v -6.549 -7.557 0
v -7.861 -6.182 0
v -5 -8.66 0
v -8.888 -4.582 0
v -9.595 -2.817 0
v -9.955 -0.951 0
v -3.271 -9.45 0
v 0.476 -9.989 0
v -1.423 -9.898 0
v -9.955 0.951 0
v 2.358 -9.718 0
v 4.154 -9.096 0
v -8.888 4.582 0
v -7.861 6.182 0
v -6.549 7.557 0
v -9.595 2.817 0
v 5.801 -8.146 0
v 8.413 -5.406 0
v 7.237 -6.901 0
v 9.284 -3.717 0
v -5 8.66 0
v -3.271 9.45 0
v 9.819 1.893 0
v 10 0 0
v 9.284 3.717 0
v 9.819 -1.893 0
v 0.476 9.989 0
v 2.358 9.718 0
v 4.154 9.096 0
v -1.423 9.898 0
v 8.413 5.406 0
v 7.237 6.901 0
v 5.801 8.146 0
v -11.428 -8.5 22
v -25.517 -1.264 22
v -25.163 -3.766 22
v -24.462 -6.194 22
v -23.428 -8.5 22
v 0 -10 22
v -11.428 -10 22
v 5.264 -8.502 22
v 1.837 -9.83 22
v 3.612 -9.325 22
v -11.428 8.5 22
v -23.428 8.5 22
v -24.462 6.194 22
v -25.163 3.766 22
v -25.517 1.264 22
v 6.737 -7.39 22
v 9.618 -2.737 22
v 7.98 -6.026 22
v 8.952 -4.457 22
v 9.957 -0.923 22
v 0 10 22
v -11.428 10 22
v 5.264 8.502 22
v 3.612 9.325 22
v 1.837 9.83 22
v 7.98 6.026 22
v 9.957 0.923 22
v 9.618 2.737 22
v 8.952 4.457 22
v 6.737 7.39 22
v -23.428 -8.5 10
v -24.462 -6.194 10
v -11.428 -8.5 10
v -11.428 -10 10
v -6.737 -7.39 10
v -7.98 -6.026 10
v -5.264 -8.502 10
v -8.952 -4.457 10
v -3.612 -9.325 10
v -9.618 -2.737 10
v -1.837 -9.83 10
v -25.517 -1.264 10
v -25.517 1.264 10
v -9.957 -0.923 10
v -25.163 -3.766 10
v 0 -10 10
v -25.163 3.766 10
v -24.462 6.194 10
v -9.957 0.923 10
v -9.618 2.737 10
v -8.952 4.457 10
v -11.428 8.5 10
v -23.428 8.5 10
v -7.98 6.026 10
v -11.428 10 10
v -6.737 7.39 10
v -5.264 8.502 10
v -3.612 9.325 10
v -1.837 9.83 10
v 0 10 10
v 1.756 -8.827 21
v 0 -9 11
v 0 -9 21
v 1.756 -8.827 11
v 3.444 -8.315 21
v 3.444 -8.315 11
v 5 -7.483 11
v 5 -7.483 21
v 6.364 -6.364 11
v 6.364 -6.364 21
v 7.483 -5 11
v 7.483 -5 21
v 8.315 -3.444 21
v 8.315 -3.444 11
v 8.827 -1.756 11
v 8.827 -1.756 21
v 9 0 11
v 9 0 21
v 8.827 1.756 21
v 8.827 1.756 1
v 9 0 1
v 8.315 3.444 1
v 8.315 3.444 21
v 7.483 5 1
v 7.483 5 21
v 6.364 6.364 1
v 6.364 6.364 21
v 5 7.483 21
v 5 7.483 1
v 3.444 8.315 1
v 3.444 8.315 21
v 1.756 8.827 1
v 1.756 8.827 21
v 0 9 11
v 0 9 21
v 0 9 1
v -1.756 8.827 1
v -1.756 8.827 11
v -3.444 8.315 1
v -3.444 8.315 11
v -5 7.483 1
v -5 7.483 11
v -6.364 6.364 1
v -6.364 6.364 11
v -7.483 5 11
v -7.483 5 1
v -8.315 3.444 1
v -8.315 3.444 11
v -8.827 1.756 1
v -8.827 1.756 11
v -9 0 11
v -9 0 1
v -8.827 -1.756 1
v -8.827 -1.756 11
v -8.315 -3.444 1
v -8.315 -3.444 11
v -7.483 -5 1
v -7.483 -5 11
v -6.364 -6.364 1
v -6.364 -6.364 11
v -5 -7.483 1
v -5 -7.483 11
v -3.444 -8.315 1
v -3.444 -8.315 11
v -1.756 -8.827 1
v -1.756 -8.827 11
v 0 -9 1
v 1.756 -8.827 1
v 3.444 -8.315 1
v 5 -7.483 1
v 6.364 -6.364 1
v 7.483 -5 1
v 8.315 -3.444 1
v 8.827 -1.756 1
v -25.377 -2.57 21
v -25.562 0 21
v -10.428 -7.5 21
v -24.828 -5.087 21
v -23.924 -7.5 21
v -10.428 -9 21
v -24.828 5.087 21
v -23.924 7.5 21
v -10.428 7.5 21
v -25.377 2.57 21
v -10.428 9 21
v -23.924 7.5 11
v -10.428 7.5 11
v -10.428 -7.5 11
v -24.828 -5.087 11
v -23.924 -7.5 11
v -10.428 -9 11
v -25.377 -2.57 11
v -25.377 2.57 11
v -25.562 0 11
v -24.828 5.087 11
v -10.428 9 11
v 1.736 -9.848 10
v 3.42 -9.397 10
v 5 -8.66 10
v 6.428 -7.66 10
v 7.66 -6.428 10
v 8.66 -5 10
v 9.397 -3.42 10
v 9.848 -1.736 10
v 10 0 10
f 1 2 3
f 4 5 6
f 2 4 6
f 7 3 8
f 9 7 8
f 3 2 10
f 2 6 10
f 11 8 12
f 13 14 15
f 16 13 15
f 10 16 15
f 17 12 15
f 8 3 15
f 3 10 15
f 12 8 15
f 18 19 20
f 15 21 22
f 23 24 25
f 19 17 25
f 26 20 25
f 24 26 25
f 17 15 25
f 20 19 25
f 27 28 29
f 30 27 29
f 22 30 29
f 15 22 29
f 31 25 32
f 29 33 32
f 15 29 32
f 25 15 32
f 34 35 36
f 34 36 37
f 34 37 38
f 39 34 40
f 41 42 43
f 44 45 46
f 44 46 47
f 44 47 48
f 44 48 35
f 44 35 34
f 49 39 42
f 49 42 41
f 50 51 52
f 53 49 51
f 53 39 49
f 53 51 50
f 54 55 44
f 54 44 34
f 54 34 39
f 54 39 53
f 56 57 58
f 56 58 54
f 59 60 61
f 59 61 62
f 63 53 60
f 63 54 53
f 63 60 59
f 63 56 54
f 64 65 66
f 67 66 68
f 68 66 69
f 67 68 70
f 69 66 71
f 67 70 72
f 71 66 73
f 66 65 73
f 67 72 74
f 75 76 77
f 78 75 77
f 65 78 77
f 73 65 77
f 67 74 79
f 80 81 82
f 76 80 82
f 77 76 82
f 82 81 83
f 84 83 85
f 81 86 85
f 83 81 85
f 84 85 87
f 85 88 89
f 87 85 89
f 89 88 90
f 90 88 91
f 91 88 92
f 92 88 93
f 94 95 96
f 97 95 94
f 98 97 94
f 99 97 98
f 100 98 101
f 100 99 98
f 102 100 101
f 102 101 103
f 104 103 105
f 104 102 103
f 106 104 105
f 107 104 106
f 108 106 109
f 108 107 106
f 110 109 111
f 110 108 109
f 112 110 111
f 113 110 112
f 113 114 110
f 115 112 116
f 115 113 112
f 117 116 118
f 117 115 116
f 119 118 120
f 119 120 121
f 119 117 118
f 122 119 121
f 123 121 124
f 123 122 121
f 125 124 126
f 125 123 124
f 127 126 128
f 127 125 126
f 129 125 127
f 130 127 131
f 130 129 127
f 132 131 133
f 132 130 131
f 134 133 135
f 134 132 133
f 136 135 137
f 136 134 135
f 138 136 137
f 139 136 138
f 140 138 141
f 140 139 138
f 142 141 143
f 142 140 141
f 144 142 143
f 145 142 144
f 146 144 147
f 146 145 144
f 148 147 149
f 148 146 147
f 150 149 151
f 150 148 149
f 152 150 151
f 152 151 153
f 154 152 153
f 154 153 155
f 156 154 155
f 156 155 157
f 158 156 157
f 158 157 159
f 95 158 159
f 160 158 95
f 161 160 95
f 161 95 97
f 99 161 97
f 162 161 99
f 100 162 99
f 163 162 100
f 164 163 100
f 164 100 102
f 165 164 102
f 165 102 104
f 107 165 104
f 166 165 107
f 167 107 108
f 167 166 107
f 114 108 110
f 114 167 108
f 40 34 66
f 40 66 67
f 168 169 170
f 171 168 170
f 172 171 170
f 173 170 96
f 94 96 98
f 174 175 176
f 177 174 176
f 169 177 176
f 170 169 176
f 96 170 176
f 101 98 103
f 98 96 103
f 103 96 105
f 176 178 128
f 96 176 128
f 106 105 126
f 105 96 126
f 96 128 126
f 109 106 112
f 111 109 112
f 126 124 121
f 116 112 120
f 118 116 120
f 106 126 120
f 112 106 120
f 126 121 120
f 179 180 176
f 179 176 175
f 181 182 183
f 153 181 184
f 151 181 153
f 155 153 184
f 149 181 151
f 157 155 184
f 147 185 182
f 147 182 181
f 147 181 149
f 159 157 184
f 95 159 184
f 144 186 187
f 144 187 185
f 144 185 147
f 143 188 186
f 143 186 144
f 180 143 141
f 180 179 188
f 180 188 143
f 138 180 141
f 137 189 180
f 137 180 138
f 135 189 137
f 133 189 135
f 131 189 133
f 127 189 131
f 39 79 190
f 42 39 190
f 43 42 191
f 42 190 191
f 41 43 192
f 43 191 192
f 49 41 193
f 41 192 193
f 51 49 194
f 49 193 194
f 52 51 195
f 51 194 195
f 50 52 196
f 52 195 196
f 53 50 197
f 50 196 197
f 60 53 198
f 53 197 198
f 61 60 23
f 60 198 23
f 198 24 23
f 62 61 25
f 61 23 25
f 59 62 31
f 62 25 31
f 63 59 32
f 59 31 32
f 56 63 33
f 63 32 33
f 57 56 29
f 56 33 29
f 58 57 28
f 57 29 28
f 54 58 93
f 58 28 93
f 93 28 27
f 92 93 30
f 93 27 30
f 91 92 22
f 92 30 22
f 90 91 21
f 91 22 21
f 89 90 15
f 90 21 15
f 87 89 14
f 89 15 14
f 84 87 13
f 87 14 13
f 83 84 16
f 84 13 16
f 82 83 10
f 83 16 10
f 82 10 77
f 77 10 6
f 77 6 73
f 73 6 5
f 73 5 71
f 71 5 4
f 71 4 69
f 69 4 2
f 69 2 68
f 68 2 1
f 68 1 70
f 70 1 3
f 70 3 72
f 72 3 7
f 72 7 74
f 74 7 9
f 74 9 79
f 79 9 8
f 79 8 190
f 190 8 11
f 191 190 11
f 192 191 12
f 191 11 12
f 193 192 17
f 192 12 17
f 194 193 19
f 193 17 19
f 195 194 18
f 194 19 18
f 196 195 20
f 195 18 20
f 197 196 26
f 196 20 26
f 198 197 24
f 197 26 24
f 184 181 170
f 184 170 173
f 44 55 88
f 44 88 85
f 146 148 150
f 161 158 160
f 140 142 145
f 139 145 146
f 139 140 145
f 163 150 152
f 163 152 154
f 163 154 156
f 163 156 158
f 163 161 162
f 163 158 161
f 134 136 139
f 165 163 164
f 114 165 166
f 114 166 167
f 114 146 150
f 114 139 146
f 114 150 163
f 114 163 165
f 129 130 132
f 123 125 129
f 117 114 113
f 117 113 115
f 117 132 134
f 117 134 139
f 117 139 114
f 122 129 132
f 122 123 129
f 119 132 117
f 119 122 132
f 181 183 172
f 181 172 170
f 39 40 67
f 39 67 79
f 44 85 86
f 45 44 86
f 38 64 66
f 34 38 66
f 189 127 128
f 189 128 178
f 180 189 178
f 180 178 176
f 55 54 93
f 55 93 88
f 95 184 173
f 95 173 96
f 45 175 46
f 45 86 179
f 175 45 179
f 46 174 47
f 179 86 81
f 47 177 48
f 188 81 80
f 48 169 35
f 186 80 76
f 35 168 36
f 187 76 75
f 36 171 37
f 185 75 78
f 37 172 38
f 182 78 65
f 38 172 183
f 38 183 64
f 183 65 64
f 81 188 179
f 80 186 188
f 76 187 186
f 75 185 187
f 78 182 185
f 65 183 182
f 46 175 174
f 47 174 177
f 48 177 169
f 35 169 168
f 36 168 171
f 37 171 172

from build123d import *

# Parameters (mm, degrees)
ESQUISSE1_R        = 10
BOSS_EXTRU_1_DEPTH = 10
BOSS_EXTRU_4_DEPTH = 12
COQUE1_START       = 11
COQUE1_DEPTH       = 10
COQUE1_START_2     = 1
COQUE1_2_OUTLINE_R = 9
COQUE1_2_DEPTH     = 10


# Read off the part's stored shape, not the designer's step: Coque1
with BuildPart() as part:
    # Esquisse1 → Boss.-Extru.1 (new body)
    with BuildSketch(Plane.XY):
        Circle(ESQUISSE1_R)
    extrude(amount=BOSS_EXTRU_1_DEPTH)

    # Esquisse5 → Boss.-Extru.4 (add)
    with BuildSketch(Plane.XY.offset(10)):
        with BuildLine():
            Line((-11.427841592, -10), (0, -10))
            ThreePointArc((0, -10), (10, 0), (0, 10))
            Line((0, 10), (-11.427841592, 10))
            Line((-11.427841592, 10), (-11.427841592, 8.5))
            Line((-11.427841592, 8.5), (-23.427841592, 8.5))
            ThreePointArc((-23.427841592, 8.5), (-25.561840174, 0), (-23.427841592, -8.5))
            Line((-23.427841592, -8.5), (-11.427841592, -8.5))
            Line((-11.427841592, -8.5), (-11.427841592, -10))
        make_face()
    extrude(amount=BOSS_EXTRU_4_DEPTH)

    # Coque1 outline → Coque1 (cut)
    with BuildSketch(Plane.XY.offset(COQUE1_START)):
        with BuildLine():
            ThreePointArc((0, -9), (9, 0), (0, 9))
            Line((0, 9), (-10.427841592, 9))
            Line((-10.427841592, 9), (-10.427841592, 7.5))
            Line((-10.427841592, 7.5), (-23.924439446, 7.5))
            ThreePointArc((-23.924439446, 7.5), (-25.561840174, 0), (-23.924439446, -7.5))
            Line((-23.924439446, -7.5), (-10.427841592, -7.5))
            Line((-10.427841592, -7.5), (-10.427841592, -9))
            Line((-10.427841592, -9), (0, -9))
        make_face()
    extrude(amount=COQUE1_DEPTH, mode=Mode.SUBTRACT)

    # Coque1 2 outline → Coque1 2 (cut)
    with BuildSketch(Plane.XY.offset(COQUE1_START_2)):
        Circle(COQUE1_2_OUTLINE_R)
    extrude(amount=COQUE1_2_DEPTH, mode=Mode.SUBTRACT)


solid = part.part
